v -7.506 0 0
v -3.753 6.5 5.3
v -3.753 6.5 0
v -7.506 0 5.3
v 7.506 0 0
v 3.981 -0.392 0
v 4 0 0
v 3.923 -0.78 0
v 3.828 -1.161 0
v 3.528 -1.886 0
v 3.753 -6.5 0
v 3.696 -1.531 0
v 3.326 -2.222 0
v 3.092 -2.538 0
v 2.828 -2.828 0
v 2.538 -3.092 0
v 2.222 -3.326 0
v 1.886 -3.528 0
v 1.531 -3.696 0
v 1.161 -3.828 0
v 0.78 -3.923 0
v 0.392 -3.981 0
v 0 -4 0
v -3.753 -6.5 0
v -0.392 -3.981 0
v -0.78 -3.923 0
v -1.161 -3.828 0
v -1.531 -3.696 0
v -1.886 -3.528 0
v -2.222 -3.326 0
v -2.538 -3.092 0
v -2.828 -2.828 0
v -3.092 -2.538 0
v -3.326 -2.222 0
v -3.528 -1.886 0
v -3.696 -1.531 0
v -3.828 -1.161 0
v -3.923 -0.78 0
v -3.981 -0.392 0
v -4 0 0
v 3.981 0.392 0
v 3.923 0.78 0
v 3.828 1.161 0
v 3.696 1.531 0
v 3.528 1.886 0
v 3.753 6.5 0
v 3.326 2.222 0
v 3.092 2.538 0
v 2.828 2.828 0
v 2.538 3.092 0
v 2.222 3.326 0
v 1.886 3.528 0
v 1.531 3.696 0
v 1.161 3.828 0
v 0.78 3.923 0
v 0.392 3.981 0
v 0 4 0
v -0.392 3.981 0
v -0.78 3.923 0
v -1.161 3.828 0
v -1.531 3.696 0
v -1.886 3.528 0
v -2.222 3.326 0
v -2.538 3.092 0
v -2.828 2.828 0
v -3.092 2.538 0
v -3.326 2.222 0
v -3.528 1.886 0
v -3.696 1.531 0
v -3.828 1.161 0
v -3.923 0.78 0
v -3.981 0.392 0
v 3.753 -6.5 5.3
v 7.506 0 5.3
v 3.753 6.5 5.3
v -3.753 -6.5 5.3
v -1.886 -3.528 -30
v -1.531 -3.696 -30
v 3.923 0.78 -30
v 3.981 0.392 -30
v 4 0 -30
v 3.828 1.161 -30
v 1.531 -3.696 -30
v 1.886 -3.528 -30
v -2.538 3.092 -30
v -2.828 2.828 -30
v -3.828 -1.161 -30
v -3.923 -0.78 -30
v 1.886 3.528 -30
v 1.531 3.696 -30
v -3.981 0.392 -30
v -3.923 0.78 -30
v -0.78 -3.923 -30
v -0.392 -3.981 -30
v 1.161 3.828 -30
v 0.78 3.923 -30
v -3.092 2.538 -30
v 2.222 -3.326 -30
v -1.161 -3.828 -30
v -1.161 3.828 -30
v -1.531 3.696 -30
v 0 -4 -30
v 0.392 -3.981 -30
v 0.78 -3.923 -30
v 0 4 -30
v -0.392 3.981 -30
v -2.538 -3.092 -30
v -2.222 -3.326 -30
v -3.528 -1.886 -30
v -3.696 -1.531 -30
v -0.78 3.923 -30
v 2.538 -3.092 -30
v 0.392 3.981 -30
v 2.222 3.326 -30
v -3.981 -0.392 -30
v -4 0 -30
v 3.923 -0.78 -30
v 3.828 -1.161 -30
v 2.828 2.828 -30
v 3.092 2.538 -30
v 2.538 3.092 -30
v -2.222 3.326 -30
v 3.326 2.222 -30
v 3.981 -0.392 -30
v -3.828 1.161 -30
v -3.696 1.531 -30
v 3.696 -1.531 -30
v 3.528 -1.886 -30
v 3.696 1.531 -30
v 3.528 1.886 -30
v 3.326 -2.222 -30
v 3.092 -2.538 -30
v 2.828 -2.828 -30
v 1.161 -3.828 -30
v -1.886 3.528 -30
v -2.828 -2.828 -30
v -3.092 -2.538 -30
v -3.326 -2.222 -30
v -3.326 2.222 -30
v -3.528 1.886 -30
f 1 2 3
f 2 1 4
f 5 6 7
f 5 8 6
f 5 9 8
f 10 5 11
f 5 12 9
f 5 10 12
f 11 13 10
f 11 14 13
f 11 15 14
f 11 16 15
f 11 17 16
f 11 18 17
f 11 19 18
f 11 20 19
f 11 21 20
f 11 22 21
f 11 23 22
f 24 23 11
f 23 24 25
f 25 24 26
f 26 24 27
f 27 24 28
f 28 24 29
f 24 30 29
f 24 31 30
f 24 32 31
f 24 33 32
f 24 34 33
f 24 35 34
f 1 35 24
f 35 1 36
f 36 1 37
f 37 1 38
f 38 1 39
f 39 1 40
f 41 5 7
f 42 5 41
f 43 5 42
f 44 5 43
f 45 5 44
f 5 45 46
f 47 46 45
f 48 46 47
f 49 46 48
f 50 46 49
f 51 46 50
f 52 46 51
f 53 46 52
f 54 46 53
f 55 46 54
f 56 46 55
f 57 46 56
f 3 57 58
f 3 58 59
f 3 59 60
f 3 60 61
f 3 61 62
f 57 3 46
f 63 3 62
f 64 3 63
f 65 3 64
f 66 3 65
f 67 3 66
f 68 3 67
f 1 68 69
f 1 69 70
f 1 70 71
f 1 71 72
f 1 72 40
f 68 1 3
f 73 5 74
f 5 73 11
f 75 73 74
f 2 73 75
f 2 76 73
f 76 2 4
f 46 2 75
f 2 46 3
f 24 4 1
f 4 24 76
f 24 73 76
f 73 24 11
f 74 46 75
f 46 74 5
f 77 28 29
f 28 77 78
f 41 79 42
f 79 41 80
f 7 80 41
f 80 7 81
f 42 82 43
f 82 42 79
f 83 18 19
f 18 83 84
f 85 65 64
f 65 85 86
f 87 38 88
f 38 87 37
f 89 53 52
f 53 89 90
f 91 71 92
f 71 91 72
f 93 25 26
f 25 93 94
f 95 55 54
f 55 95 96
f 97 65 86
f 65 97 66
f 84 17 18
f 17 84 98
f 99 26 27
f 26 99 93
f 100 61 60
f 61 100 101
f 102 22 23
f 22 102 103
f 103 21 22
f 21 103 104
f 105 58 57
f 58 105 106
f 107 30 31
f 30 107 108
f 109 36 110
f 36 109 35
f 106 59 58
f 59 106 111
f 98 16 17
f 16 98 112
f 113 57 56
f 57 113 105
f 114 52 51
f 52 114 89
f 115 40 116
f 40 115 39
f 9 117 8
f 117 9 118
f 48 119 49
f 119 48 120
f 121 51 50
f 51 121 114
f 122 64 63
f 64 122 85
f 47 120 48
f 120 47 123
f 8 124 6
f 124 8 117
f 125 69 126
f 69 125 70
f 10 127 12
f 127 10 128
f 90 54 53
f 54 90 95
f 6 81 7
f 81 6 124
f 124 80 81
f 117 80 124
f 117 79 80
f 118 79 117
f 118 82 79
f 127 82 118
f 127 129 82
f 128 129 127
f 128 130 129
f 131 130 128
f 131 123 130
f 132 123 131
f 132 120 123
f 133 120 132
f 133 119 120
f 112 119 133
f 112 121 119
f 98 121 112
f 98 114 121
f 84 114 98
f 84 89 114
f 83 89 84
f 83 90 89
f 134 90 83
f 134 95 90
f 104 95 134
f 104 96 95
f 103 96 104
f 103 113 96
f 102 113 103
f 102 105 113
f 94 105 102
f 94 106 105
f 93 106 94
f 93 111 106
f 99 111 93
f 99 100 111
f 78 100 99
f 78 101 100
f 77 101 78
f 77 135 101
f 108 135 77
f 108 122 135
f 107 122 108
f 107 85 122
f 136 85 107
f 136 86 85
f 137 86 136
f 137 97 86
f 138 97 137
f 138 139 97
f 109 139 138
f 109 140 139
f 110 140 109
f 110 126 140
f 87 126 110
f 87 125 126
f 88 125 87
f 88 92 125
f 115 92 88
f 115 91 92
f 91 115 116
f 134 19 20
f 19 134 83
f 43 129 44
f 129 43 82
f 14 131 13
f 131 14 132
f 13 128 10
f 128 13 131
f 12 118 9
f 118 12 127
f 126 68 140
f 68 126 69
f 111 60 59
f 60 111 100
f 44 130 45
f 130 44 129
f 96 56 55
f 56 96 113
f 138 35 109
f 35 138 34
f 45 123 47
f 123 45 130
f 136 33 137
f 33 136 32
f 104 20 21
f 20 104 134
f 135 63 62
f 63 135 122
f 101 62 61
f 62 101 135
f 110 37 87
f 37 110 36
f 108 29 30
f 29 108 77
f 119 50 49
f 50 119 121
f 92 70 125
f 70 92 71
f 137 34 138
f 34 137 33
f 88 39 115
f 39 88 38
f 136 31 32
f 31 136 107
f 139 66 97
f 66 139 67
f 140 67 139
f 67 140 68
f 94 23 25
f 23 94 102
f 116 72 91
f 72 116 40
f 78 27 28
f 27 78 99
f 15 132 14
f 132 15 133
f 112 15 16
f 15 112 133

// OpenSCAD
af = 13; // across-flats (mm)
head_h = 5.3; // head height (mm)
shank_d = 8; // shank diameter (mm)
shank_len = 30; // shank length (mm)

hex_R = af / sqrt(3);

union() {
    linear_extrude(height = head_h)
        circle(r = hex_R, $fn = 6);
    translate([0,0,-shank_len])
        cylinder(h = shank_len, r = shank_d/2, $fn = 64);
}
